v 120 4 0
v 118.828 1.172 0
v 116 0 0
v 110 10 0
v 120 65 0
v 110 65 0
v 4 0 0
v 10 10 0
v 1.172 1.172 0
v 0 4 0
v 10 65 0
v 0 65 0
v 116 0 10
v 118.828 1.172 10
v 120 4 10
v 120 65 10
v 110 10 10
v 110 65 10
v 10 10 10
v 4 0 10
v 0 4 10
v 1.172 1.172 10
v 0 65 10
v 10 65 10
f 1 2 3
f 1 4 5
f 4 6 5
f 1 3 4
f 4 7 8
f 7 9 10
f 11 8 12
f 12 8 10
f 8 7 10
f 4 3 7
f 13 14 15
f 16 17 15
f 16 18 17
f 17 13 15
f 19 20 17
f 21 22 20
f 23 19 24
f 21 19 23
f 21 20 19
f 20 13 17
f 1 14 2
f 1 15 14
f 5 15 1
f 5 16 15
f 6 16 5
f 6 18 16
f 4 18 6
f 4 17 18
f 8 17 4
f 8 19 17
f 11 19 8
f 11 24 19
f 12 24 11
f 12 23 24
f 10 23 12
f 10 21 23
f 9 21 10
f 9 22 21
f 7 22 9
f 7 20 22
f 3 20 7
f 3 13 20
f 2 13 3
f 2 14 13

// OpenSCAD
$fn = 32;

// ----------------------------------------------------------------------
// Heat sink frame: 120 x 65 mm frame, 10 mm walls
// ----------------------------------------------------------------------

// --- parameters (mm) ---
profile_height = 10;      // extrusion height
profile_points = 12;      // points of the closed outline

profile = [[0, 4], [1.172, 1.172], [4, 0], [116, 0], [118.828, 1.172], [120, 4], [120, 65], [110, 65], [110, 10], [10, 10], [10, 65], [0, 65]];  // single closed polygon, 12 points, counter clockwise

// --- the one profile operation ---
linear_extrude(height = profile_height) polygon(points = profile);
